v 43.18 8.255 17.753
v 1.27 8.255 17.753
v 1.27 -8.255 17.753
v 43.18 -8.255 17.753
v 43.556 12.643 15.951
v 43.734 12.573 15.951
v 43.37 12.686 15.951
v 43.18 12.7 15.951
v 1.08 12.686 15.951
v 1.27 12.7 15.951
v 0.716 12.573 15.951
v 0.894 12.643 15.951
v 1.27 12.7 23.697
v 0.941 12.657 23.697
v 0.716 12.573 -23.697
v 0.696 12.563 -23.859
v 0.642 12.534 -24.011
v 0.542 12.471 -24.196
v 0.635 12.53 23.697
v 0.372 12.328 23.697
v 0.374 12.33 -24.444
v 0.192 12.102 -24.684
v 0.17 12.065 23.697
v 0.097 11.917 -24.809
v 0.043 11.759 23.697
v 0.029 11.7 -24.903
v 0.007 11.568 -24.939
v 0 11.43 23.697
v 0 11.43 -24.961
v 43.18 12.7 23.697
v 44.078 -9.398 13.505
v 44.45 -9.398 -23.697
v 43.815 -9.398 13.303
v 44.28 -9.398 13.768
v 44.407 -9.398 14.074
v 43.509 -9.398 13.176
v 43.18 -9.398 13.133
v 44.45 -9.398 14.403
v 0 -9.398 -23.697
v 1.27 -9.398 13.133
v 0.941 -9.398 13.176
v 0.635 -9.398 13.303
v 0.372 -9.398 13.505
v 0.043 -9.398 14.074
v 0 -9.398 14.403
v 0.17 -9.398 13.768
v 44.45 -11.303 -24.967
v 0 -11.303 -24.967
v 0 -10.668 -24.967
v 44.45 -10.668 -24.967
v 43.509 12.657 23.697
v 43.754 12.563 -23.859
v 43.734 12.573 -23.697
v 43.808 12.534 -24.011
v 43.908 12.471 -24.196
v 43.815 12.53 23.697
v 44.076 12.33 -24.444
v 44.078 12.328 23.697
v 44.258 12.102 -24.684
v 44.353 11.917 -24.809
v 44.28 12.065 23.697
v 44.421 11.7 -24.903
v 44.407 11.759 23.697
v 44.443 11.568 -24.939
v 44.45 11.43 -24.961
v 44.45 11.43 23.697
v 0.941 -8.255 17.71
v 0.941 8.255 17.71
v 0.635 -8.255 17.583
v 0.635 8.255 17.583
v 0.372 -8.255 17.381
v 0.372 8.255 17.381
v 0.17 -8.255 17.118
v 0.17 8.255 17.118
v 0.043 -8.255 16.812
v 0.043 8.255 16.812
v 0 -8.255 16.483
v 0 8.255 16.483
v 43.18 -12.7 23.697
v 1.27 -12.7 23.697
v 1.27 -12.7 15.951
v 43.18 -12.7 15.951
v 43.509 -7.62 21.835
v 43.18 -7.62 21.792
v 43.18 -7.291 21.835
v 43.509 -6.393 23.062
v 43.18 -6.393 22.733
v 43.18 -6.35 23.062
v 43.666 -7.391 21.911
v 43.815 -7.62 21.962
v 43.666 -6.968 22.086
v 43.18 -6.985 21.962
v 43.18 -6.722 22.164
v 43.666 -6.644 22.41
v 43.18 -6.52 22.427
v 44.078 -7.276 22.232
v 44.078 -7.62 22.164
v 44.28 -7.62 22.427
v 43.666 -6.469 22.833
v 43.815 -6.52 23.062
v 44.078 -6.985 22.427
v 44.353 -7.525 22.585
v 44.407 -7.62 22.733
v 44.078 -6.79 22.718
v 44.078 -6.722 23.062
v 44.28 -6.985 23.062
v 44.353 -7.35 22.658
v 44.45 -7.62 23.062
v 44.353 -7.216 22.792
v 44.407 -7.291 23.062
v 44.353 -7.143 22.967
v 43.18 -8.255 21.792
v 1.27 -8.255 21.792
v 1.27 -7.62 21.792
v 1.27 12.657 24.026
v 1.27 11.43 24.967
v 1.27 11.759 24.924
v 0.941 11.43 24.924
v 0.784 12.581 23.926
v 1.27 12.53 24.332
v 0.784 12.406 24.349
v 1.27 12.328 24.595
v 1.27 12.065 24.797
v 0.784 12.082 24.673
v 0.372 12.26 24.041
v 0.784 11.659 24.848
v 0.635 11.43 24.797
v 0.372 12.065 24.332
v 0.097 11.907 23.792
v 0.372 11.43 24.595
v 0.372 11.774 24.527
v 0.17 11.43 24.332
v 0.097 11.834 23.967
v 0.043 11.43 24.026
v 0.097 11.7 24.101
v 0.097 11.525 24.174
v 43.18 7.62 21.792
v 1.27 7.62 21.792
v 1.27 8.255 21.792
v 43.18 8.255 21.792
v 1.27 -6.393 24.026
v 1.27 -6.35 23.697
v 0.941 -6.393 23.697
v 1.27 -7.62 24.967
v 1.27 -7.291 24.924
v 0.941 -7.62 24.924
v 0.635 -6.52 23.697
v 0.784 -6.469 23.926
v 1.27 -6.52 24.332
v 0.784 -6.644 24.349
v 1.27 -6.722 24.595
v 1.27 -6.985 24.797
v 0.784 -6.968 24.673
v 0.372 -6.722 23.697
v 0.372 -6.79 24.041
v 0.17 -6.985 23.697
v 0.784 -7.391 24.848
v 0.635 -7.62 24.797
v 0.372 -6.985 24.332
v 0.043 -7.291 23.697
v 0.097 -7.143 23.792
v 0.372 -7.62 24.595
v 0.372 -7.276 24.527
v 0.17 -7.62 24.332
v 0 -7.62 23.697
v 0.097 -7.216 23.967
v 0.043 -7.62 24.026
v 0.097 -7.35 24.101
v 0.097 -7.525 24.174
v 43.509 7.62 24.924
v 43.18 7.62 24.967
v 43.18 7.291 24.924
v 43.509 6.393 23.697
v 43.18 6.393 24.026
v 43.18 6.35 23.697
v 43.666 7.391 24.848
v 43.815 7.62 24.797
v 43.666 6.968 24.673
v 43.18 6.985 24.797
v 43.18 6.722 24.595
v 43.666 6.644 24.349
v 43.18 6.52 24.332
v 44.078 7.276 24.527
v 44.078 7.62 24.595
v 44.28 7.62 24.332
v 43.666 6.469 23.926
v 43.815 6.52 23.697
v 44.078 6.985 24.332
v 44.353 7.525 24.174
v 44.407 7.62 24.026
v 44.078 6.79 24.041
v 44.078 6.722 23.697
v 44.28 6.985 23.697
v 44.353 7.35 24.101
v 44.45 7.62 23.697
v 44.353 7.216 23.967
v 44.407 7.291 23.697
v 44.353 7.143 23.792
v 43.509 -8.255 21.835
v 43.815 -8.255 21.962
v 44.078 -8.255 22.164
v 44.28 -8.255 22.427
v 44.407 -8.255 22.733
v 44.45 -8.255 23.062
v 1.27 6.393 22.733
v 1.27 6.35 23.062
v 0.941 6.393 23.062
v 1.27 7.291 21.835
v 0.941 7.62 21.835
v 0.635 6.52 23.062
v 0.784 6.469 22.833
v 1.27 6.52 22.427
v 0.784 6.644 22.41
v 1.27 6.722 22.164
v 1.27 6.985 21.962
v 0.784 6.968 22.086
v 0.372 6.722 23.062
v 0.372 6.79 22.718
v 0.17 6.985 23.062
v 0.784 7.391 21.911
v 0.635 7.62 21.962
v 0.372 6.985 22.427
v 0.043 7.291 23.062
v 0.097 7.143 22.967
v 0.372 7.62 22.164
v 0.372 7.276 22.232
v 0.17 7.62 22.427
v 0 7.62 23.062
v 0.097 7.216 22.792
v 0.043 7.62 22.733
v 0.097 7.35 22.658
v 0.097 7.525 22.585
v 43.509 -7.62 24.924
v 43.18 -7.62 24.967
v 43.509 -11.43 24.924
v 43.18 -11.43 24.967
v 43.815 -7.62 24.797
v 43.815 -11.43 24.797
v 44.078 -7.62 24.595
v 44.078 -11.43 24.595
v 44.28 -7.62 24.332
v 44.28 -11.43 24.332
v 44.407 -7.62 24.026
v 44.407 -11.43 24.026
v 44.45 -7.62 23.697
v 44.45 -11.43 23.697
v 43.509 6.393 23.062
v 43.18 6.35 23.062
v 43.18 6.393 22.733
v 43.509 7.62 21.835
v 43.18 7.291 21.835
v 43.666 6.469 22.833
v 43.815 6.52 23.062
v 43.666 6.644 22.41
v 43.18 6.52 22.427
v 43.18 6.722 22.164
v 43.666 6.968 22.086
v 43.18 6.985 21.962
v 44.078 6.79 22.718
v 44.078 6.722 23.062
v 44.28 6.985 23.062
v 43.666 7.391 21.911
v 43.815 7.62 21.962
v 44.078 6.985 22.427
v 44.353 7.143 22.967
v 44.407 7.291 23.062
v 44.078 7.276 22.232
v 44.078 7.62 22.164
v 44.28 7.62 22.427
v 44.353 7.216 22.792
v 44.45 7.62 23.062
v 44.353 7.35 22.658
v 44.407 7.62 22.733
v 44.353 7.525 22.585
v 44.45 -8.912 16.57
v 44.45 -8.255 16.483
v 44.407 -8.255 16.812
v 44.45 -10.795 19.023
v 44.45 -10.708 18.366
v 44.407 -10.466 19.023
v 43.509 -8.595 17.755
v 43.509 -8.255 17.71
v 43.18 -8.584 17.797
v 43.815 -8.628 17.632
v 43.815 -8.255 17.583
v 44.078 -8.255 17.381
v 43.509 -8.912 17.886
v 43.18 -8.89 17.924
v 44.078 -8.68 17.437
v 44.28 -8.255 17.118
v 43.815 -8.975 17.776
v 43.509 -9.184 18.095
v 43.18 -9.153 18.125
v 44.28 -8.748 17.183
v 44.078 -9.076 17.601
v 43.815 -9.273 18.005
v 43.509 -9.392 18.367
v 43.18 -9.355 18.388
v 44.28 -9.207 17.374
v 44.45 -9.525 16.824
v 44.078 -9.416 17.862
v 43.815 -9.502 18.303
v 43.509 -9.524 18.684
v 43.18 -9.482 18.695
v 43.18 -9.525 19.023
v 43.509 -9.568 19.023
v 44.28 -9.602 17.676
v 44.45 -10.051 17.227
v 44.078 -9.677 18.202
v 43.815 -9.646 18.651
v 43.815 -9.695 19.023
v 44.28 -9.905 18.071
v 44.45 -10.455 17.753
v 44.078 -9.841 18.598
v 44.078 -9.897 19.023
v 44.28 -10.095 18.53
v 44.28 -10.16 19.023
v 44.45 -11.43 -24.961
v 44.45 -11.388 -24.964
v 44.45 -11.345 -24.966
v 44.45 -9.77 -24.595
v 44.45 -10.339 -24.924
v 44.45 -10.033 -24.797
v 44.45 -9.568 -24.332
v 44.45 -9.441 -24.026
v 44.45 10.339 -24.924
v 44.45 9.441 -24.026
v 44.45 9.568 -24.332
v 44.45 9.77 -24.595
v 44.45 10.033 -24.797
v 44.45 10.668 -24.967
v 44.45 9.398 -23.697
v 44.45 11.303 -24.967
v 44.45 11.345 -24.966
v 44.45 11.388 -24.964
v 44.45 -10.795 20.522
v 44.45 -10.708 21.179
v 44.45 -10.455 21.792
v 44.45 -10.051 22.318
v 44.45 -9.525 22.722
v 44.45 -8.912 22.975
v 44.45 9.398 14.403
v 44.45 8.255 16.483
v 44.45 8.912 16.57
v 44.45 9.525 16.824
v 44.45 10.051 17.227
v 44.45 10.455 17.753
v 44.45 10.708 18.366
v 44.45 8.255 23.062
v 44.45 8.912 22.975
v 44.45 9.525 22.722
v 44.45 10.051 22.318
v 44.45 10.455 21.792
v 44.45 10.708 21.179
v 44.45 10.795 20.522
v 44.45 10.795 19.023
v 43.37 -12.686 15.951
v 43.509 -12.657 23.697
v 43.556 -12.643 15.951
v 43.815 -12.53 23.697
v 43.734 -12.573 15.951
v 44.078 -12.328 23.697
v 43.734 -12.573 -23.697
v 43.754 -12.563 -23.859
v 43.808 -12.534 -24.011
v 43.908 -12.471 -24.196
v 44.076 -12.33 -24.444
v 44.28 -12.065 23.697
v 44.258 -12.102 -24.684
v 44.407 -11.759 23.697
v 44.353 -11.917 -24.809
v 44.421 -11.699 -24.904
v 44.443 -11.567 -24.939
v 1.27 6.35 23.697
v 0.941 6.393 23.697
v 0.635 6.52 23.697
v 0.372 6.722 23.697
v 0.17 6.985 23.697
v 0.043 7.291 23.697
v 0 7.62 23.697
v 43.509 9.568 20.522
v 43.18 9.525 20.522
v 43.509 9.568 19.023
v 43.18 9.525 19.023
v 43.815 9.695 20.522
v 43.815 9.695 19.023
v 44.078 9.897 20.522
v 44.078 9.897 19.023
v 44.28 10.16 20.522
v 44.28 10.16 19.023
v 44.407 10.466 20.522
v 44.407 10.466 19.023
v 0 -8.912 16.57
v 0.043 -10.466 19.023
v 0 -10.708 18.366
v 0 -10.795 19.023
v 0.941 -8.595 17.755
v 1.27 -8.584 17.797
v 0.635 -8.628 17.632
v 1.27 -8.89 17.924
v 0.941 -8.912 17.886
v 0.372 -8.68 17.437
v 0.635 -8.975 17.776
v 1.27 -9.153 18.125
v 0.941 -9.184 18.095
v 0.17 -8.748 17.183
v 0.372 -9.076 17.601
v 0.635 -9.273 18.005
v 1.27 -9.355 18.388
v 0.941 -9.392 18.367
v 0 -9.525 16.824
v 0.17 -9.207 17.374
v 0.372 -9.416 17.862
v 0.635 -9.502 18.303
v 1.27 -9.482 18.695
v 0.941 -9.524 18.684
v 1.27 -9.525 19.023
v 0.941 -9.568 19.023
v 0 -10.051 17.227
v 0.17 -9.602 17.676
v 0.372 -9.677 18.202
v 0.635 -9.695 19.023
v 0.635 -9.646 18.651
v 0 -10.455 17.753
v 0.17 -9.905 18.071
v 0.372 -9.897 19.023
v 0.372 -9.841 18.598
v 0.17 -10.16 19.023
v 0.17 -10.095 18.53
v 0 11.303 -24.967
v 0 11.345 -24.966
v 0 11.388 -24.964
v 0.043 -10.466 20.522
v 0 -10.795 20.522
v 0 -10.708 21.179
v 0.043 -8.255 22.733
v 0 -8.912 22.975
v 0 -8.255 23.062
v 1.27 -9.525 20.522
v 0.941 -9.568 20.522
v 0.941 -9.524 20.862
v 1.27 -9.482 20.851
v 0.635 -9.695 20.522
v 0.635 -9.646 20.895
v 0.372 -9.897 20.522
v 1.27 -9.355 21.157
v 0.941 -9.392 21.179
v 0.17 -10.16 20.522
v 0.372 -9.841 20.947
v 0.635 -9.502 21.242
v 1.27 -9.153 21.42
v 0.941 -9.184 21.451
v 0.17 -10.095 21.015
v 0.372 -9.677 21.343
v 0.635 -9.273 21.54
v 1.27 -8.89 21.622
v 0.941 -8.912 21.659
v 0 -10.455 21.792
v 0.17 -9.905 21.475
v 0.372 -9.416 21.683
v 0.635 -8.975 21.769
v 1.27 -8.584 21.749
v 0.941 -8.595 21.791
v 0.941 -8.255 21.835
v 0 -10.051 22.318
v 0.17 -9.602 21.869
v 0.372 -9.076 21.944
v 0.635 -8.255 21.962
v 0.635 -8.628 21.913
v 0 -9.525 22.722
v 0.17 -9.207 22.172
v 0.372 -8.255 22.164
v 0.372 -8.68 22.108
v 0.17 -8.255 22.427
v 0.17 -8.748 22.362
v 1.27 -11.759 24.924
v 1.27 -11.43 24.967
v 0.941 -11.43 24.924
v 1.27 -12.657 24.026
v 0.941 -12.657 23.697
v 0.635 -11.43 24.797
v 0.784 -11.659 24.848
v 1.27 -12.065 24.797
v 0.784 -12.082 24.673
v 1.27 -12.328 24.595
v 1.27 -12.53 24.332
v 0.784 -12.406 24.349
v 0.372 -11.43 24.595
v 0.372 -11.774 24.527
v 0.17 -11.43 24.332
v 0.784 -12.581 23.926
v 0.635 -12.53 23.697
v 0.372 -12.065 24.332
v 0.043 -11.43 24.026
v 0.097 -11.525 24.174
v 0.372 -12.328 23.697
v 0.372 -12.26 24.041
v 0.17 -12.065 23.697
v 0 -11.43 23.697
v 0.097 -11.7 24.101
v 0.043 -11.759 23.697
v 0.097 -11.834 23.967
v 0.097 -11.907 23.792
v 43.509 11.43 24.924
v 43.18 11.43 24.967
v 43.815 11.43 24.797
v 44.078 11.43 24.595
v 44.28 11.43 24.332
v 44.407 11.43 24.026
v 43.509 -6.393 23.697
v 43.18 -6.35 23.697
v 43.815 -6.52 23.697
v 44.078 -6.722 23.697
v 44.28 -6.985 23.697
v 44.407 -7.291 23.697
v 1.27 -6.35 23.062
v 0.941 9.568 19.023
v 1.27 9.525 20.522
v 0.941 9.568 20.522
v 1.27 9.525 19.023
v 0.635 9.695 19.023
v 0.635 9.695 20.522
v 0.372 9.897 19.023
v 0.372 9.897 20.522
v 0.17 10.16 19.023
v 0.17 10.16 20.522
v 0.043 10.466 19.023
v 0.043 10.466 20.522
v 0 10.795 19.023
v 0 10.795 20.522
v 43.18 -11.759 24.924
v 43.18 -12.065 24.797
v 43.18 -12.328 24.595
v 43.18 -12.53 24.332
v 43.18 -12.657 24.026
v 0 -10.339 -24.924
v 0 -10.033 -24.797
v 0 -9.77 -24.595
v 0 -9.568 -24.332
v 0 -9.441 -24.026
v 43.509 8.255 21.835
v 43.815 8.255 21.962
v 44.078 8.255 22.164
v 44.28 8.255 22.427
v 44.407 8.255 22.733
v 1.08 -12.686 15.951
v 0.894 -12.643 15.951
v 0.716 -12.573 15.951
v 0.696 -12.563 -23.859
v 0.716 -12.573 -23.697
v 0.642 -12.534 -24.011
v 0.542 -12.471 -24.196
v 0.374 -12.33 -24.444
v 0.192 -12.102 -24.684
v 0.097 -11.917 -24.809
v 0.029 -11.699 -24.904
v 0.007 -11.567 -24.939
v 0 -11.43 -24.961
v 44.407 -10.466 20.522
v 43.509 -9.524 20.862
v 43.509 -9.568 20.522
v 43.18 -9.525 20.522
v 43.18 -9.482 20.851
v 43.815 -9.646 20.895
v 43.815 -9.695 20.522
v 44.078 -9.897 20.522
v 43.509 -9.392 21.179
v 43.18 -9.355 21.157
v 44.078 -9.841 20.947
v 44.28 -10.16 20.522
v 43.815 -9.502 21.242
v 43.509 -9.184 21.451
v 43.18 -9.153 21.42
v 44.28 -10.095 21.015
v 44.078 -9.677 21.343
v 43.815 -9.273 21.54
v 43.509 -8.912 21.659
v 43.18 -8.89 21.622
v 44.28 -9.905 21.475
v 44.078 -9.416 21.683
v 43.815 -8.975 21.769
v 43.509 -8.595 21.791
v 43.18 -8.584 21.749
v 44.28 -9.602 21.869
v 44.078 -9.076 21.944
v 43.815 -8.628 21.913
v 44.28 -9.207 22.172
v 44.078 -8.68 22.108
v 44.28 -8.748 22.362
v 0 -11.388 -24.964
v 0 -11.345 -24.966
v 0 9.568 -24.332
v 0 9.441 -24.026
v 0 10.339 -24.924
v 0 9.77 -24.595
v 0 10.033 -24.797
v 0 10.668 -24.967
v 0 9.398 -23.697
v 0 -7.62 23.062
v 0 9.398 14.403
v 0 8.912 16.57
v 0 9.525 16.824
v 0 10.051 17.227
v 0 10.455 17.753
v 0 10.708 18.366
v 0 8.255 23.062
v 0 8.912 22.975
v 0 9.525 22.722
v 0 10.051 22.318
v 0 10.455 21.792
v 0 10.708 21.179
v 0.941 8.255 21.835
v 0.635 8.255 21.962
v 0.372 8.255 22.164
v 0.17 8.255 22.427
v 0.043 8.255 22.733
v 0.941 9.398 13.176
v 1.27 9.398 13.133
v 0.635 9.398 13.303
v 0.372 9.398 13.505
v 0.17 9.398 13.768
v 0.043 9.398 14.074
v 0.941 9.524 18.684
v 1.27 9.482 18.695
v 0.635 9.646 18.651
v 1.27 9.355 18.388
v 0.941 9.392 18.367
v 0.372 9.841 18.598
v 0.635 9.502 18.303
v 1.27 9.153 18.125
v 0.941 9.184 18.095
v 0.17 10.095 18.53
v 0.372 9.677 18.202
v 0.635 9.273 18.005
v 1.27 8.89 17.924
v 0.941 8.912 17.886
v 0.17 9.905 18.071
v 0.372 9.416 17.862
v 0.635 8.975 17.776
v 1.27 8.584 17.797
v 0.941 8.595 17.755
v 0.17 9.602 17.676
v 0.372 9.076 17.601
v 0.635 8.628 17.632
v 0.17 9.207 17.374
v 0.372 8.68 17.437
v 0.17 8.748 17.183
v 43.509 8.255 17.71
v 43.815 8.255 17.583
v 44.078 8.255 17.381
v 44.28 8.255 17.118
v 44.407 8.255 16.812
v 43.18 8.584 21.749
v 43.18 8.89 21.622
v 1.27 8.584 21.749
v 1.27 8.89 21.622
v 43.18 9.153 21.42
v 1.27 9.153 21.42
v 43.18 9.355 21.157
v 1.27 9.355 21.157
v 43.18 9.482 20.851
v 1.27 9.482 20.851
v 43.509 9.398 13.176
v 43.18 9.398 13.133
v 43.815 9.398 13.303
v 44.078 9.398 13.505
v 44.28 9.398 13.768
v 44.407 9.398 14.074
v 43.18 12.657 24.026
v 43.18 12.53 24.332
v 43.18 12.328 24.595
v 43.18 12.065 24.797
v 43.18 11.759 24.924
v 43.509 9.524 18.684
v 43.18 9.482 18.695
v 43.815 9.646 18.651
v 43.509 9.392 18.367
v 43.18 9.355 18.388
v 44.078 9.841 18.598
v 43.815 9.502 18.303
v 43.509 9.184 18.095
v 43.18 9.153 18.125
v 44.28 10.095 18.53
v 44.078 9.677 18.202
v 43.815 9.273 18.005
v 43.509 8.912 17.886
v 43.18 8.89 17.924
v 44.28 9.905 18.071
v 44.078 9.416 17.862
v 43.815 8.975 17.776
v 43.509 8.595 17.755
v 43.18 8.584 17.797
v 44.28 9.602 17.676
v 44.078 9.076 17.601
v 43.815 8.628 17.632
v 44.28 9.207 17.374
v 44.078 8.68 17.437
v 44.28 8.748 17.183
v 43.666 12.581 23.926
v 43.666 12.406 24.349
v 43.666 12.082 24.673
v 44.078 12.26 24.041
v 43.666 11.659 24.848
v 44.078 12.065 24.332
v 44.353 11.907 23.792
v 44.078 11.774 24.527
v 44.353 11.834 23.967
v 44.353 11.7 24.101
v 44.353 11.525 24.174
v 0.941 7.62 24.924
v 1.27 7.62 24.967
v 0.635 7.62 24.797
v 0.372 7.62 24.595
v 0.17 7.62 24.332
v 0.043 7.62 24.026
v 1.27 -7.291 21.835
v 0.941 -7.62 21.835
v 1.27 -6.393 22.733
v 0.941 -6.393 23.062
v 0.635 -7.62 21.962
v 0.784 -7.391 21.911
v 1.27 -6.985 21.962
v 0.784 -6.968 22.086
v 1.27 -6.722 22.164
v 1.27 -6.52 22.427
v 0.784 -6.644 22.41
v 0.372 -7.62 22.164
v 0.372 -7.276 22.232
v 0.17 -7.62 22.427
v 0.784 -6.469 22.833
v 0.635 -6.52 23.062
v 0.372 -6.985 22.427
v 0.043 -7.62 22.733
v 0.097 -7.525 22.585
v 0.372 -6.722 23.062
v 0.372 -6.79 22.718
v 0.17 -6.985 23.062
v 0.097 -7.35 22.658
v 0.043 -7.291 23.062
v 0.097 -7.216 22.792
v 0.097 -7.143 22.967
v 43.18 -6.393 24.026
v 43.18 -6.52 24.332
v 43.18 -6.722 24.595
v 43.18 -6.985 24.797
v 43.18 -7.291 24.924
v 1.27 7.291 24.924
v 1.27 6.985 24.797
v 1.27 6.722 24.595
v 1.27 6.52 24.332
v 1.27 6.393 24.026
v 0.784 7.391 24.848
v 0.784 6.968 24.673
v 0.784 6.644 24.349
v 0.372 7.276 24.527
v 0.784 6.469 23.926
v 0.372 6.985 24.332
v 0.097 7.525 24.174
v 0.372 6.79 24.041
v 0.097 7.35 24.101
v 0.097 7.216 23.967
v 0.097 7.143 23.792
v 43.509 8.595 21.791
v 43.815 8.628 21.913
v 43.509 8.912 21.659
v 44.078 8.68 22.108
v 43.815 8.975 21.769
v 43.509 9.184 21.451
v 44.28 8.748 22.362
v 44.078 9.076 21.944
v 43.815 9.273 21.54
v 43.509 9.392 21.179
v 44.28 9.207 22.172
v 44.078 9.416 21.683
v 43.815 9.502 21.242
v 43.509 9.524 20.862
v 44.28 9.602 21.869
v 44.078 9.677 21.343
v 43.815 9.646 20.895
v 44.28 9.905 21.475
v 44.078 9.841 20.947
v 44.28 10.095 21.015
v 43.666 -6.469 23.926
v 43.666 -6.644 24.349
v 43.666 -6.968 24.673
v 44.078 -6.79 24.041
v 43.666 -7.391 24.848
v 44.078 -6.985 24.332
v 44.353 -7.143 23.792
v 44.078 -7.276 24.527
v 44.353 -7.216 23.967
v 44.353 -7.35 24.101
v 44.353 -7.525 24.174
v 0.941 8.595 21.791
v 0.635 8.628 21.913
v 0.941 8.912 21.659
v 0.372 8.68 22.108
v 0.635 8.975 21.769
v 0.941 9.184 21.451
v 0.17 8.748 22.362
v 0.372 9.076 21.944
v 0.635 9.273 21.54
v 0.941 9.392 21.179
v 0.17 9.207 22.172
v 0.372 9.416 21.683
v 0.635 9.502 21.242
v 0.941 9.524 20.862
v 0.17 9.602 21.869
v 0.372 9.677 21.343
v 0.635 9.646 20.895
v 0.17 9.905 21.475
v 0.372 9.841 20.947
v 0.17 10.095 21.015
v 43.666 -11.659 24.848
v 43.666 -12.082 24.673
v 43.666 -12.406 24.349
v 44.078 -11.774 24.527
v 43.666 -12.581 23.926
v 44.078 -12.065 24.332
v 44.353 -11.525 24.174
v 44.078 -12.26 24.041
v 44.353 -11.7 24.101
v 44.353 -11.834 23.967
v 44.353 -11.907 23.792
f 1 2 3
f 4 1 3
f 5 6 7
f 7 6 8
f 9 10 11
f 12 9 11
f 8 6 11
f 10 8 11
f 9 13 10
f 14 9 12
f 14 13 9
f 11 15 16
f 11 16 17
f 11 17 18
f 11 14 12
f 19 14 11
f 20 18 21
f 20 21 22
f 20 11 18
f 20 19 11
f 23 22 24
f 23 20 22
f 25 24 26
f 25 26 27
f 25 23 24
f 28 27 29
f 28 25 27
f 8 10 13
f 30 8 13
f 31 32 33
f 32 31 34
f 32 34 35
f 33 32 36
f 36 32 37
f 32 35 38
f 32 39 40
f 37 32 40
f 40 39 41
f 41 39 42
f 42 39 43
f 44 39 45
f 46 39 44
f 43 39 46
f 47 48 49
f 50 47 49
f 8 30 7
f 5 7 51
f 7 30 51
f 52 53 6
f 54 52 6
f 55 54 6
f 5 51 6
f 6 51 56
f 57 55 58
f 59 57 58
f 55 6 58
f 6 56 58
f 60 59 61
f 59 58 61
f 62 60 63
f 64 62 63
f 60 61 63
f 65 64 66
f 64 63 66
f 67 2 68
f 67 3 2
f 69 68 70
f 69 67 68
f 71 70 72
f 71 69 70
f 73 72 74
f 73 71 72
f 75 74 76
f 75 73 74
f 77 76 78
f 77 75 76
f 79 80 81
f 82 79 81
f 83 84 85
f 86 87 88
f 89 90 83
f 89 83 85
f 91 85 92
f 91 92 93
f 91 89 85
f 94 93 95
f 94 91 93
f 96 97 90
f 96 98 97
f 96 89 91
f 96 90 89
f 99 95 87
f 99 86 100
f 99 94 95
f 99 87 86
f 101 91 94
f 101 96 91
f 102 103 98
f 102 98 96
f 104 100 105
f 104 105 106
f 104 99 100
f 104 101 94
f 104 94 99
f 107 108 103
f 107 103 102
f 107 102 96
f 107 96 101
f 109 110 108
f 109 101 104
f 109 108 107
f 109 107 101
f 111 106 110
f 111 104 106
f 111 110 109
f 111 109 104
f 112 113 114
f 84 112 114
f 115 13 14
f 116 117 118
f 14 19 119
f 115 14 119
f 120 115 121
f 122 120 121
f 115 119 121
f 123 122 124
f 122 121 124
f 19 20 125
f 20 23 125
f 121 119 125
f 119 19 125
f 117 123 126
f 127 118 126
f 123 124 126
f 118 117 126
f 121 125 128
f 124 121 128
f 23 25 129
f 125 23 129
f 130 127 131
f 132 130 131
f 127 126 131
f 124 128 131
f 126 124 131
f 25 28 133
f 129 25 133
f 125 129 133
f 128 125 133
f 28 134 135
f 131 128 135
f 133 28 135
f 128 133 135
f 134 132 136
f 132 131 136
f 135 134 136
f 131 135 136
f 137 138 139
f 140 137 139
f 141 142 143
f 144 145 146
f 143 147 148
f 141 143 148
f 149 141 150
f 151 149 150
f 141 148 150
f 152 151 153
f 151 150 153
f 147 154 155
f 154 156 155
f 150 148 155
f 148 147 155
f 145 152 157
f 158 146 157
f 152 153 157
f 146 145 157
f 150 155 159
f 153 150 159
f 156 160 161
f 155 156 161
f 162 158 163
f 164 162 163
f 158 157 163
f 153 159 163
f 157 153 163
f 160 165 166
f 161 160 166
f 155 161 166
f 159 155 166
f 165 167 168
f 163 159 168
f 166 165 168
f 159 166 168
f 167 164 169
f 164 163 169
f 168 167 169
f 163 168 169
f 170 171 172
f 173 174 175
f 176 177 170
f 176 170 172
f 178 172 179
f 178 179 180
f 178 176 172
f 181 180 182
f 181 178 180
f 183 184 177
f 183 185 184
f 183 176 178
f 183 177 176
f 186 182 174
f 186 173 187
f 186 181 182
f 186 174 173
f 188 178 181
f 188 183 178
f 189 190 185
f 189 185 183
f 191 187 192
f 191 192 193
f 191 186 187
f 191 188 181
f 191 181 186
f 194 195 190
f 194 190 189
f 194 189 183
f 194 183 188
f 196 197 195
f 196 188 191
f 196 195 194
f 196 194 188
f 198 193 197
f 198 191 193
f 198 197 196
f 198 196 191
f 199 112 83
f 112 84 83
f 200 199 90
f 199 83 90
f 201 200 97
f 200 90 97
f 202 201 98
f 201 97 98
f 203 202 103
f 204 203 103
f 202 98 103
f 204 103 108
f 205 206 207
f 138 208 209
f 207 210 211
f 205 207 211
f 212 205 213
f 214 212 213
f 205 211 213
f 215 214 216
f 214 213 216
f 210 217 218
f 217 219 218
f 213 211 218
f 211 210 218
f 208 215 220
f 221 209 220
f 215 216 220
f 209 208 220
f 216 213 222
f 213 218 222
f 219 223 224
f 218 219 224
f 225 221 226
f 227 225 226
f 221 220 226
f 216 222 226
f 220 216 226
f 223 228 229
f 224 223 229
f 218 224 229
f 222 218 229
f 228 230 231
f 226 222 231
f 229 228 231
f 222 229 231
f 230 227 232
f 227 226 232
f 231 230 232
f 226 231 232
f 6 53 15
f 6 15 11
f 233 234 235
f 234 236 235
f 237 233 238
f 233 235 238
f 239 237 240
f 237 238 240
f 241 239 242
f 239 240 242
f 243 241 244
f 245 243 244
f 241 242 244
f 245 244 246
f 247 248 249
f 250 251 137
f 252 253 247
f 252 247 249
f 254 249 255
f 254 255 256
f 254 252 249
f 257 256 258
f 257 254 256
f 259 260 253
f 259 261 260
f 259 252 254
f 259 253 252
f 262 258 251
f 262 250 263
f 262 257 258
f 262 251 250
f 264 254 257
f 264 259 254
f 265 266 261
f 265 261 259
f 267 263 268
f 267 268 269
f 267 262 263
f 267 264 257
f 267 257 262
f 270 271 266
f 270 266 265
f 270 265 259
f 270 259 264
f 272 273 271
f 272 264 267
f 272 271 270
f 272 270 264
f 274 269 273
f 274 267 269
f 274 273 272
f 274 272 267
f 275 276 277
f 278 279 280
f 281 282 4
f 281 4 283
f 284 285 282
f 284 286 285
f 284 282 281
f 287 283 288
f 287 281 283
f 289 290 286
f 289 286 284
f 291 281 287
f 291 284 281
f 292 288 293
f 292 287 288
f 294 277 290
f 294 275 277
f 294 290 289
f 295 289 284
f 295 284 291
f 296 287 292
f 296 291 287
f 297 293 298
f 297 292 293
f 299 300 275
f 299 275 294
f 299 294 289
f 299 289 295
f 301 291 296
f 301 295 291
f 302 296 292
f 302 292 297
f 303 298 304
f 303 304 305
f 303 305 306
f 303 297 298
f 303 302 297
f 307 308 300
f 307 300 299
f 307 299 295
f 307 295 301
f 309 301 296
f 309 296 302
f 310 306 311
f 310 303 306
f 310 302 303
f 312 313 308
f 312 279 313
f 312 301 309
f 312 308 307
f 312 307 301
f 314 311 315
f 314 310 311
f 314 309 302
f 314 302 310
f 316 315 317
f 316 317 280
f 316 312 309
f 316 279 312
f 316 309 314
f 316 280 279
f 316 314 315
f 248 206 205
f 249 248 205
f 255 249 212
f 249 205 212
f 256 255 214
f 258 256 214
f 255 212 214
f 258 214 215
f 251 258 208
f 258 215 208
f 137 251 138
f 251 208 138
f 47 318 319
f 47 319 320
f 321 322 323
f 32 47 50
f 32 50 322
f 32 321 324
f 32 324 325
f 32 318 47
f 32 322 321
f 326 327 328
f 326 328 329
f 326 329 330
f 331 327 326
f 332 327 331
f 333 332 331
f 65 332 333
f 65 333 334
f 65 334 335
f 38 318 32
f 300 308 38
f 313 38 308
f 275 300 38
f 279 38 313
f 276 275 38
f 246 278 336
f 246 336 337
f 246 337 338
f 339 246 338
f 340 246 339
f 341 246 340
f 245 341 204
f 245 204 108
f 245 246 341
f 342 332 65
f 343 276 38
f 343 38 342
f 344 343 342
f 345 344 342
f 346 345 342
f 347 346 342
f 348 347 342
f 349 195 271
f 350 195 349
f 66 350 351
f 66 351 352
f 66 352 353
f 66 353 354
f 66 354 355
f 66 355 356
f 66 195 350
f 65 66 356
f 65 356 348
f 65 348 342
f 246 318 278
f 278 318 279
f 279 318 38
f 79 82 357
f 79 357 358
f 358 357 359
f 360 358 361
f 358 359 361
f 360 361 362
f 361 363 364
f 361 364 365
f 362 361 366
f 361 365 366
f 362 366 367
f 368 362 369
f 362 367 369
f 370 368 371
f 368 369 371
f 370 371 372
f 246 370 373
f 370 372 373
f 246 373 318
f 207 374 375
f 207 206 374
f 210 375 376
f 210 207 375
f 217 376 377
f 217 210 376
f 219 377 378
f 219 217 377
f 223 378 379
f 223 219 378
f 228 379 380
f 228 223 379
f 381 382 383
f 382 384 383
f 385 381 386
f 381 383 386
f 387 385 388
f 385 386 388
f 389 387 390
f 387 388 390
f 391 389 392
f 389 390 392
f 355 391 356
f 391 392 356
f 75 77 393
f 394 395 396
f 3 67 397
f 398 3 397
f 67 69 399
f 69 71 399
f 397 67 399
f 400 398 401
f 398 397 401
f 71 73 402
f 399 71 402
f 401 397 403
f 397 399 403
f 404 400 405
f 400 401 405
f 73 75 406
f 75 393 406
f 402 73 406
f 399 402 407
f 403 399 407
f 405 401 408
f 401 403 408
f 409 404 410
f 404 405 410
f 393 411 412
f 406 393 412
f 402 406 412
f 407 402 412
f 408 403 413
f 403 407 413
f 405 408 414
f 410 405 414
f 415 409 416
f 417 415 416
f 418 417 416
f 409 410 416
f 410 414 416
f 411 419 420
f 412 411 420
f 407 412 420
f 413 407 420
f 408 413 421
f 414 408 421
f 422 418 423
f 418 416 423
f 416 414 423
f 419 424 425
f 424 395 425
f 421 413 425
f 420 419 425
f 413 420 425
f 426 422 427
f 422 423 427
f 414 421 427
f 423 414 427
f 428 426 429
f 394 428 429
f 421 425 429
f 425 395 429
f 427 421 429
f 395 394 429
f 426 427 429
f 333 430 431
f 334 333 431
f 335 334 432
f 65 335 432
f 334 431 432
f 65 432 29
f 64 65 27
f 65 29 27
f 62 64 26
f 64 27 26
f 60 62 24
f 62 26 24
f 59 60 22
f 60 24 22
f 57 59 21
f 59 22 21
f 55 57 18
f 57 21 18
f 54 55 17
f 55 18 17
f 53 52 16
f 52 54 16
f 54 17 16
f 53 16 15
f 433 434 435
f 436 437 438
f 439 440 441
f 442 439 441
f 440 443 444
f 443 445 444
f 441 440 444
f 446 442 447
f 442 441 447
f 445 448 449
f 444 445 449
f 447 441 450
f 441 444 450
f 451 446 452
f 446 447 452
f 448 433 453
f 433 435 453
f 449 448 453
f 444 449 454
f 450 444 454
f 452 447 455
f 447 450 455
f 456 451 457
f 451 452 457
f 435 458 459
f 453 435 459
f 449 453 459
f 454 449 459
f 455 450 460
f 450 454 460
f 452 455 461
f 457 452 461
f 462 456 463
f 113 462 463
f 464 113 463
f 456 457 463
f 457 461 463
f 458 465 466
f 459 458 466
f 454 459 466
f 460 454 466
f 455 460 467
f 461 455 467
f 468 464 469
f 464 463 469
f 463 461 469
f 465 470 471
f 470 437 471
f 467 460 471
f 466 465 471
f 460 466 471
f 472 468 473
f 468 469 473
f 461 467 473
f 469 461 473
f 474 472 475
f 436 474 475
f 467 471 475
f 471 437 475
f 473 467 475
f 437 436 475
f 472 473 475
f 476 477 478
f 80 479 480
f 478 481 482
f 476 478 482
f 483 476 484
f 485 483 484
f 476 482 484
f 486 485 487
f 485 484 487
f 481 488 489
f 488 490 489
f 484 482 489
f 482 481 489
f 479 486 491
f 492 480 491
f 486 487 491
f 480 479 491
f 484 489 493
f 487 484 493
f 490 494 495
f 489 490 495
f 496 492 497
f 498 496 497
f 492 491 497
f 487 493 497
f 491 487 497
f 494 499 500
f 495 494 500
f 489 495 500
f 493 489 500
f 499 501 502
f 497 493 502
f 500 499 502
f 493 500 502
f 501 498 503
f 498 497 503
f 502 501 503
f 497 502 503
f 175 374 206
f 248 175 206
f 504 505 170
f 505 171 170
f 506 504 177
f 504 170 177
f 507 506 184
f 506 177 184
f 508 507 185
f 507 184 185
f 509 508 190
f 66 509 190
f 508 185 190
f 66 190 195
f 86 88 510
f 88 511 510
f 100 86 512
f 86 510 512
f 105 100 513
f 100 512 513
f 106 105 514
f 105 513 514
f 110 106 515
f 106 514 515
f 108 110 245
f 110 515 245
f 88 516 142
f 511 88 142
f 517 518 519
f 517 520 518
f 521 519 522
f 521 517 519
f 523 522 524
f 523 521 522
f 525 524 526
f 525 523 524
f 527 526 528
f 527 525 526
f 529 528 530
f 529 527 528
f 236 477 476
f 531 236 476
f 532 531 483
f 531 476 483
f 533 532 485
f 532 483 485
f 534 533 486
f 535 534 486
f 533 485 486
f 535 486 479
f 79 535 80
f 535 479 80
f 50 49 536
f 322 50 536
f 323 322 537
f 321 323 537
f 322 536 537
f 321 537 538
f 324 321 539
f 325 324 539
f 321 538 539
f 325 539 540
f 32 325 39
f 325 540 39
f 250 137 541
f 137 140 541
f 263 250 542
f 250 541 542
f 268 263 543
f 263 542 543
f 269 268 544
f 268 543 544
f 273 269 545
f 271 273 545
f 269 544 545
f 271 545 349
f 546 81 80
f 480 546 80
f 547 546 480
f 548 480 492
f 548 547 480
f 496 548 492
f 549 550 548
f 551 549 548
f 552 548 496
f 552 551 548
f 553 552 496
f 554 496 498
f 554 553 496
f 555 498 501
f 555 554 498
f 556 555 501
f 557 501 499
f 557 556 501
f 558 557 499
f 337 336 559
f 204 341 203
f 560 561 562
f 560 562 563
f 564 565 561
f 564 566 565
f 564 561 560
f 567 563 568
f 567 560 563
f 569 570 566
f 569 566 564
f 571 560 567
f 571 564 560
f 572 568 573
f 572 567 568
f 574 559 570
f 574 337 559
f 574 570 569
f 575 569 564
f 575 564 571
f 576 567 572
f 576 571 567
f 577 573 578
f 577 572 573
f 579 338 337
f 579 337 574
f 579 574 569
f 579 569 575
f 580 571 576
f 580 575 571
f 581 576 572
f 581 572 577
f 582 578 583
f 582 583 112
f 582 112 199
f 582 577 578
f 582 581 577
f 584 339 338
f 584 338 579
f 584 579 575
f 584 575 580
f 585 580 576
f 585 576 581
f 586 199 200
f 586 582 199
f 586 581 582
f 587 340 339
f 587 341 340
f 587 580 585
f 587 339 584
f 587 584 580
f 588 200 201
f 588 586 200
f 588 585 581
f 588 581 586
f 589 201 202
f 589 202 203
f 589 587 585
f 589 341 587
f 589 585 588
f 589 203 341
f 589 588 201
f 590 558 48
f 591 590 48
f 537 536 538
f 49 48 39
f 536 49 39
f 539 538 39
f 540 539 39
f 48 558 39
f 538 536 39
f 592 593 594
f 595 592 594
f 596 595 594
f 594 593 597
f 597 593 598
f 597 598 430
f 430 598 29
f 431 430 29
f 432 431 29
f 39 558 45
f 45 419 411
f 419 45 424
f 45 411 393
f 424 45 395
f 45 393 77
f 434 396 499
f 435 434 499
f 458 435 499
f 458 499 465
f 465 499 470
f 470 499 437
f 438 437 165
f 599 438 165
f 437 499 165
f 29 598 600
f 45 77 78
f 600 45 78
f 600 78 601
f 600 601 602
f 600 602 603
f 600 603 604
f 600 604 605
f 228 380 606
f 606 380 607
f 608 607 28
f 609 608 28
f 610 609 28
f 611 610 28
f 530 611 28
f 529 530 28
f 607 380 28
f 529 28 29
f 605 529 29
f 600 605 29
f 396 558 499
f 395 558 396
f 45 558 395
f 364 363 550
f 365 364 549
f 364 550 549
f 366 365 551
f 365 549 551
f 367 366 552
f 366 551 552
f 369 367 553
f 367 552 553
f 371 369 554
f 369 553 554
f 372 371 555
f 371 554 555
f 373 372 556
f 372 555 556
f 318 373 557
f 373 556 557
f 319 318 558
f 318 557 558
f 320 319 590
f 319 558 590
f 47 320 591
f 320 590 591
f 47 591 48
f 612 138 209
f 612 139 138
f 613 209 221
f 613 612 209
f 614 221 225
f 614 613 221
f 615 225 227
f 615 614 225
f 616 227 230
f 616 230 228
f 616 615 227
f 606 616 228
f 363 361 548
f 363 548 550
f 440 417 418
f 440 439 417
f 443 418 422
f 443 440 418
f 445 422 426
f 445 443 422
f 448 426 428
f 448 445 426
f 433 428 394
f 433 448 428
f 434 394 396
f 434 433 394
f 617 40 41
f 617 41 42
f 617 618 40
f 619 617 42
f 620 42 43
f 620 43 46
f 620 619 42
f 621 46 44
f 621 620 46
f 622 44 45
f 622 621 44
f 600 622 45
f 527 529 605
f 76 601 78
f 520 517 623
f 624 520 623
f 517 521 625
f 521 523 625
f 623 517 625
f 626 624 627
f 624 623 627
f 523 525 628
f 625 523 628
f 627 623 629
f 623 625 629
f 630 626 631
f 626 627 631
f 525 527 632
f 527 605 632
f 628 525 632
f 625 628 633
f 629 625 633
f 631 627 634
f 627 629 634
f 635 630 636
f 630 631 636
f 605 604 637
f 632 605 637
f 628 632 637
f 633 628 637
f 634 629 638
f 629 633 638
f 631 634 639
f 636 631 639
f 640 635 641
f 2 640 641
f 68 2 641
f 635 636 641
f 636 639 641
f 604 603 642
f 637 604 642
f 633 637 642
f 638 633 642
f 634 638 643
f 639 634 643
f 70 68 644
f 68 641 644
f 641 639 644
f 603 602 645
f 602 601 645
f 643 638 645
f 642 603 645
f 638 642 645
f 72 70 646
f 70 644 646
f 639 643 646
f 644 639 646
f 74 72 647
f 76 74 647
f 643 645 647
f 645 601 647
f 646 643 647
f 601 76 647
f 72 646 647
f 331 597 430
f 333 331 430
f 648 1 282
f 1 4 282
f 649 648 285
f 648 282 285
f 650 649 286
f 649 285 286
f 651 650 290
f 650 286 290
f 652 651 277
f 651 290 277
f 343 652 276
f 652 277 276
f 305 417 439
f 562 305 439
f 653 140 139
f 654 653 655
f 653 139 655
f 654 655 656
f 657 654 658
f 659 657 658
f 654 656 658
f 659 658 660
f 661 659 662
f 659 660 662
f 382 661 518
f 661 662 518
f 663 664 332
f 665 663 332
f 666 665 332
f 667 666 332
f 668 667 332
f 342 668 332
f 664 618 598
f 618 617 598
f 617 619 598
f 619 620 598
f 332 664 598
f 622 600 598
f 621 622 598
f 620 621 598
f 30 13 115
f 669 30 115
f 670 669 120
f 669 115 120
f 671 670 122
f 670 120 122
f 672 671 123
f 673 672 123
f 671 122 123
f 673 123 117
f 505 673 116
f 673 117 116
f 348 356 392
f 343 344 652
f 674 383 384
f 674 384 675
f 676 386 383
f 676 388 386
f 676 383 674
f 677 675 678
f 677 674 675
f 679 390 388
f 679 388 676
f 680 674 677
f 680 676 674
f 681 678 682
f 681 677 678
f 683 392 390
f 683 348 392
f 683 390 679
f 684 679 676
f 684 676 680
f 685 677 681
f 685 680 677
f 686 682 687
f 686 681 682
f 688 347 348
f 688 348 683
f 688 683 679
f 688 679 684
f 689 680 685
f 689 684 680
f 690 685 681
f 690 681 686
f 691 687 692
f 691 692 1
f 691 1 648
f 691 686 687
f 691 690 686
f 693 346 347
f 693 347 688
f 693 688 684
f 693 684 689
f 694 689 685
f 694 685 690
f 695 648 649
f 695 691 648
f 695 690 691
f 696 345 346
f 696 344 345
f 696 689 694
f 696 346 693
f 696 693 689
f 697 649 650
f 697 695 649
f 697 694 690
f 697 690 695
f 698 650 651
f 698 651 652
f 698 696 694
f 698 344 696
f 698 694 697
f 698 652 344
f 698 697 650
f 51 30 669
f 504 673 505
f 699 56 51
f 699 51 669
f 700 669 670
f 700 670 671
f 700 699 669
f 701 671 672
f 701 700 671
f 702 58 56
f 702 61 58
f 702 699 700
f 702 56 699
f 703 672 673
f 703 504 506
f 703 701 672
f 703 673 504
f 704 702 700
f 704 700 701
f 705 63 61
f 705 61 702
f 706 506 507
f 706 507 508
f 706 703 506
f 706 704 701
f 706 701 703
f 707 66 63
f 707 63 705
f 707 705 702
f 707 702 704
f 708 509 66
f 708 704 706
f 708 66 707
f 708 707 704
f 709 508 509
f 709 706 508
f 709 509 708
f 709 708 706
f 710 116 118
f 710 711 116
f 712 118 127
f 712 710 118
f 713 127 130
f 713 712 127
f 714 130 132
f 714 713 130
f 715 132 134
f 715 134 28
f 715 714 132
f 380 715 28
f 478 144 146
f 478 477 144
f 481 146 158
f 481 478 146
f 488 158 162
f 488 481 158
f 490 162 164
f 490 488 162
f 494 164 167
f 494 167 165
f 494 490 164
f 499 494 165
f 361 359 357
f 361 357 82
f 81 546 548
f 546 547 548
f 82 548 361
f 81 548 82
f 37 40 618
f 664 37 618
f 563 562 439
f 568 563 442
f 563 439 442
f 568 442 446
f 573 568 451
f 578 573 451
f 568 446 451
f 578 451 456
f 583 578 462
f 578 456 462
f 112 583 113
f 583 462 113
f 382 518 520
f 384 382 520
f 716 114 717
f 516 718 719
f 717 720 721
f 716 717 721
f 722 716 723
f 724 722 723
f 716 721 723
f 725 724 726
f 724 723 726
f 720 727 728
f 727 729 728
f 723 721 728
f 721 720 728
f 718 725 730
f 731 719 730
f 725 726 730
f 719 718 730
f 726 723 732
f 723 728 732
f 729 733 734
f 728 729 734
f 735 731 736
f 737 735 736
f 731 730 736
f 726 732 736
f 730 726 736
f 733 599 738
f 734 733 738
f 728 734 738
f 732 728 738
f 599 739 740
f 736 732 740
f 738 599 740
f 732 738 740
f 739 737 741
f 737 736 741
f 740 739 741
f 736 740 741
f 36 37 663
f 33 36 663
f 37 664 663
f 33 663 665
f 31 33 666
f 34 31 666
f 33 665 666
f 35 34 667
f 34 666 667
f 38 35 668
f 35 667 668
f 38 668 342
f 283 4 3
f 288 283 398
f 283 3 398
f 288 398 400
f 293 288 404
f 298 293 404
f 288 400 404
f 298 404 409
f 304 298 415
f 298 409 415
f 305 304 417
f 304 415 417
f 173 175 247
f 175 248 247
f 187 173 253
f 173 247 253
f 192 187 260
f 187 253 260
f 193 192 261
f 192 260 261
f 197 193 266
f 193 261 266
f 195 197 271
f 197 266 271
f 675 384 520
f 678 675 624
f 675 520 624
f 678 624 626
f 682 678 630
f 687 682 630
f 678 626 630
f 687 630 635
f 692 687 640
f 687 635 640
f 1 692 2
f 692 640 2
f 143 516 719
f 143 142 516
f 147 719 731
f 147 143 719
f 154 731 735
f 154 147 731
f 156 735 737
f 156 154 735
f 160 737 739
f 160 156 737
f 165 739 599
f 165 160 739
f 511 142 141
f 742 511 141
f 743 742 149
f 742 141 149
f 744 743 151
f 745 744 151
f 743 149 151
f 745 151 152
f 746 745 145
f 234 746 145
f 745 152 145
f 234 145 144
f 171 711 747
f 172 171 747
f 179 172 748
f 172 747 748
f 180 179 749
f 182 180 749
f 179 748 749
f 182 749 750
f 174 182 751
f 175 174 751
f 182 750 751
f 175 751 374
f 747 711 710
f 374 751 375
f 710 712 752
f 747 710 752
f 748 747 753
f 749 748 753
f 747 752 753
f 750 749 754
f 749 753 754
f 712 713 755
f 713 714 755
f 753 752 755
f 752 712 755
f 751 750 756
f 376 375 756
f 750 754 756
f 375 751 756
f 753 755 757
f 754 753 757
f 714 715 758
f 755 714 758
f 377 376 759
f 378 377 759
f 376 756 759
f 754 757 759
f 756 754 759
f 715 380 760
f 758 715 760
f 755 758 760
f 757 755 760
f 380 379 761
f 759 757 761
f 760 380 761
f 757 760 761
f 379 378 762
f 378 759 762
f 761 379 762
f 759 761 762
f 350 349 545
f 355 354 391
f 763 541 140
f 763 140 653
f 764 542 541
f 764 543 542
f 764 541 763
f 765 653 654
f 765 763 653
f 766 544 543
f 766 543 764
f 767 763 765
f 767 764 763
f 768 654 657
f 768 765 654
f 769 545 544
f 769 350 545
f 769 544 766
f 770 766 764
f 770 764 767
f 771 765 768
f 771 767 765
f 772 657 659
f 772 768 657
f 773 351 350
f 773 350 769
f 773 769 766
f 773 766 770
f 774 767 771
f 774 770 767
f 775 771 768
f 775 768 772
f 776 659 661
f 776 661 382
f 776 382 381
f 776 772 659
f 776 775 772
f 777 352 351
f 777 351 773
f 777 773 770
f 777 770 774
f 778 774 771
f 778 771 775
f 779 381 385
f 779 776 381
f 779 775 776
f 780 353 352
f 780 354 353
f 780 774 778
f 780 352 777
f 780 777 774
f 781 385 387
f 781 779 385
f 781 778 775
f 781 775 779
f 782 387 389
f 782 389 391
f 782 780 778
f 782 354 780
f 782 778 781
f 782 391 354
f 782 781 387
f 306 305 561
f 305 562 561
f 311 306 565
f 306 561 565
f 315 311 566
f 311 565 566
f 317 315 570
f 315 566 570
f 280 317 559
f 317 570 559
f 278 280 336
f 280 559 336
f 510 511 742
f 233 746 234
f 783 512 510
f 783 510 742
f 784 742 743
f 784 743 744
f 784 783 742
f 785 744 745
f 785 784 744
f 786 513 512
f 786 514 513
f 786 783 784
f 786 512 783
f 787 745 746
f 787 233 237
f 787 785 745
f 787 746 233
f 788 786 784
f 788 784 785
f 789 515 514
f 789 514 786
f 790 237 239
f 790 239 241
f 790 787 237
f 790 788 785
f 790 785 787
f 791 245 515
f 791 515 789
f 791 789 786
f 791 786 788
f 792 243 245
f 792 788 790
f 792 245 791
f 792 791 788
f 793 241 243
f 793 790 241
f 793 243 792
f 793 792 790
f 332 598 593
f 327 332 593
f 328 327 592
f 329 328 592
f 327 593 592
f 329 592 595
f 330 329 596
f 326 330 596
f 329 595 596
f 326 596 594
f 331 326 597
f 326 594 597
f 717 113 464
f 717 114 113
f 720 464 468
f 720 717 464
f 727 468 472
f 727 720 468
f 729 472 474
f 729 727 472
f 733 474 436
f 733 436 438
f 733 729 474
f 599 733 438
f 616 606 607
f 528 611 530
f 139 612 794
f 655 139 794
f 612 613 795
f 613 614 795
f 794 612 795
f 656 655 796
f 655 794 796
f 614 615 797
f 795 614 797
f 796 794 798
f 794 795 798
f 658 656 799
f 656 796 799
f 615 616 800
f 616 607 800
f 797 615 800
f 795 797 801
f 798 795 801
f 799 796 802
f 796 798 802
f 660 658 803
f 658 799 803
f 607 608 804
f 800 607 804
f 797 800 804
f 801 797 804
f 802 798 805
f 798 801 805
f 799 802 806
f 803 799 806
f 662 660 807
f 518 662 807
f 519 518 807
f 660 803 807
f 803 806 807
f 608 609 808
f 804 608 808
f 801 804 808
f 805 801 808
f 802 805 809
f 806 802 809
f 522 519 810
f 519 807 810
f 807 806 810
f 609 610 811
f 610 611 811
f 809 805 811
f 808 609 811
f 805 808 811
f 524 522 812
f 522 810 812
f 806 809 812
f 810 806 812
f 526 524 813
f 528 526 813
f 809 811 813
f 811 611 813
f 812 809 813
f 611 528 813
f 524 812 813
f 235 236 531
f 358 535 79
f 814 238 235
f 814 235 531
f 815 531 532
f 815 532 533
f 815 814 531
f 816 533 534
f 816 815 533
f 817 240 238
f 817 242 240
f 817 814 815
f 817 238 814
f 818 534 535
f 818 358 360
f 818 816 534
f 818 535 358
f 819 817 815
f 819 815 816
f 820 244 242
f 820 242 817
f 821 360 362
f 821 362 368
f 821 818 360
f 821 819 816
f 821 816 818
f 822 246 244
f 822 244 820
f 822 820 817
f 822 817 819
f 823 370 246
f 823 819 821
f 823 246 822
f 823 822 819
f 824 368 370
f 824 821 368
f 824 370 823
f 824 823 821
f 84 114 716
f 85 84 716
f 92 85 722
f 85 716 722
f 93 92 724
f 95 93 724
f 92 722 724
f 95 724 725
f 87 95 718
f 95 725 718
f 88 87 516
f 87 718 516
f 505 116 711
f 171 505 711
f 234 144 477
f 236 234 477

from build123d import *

# Parameters (mm, degrees)
F1_DEPTH = 44.45
F2_R     = 1.27


with BuildPart() as f1:
    # F0 (on Right) → F1 (new body)
    with BuildSketch(Plane.YZ):
        with BuildLine():
            Line((10.668, -24.967044556), (11.303, -24.967044556))
            ThreePointArc((11.303, -24.967044556), (12.2010256121, -24.5950701681), (12.573, -23.697044556))
            Line((12.573, -23.697044556), (12.573, 15.9512687449))
            Line((12.573, 15.9512687449), (12.7, 15.9512687449))
            Line((12.7, 15.9512687449), (12.7, 23.697044556))
            ThreePointArc((12.7, 23.697044556), (12.3280256121, 24.5950701681), (11.43, 24.967044556))
            Line((11.43, 24.967044556), (7.62, 24.967044556))
            ThreePointArc((7.62, 24.967044556), (6.7219743879, 24.5950701681), (6.35, 23.697044556))
            Line((6.35, 23.697044556), (6.35, 23.062044556))
            ThreePointArc((6.35, 23.062044556), (6.7219743879, 22.1640189439), (7.62, 21.792044556))
            Line((7.62, 21.792044556), (8.255, 21.792044556))
            ThreePointArc((8.255, 21.792044556), (9.1530256121, 21.4200701681), (9.525, 20.522044556))
            Line((9.525, 20.522044556), (9.525, 19.023438717))
            ThreePointArc((9.525, 19.023438717), (9.1530256121, 18.1254131049), (8.255, 17.753438717))
            Line((8.255, 17.753438717), (-8.255, 17.753438717))
            ThreePointArc((-8.255, 17.753438717), (-9.1530256121, 18.1254131049), (-9.525, 19.023438717))
            Line((-9.525, 19.023438717), (-9.525, 20.522044556))
            ThreePointArc((-9.525, 20.522044556), (-9.1530256121, 21.4200701681), (-8.255, 21.792044556))
            Line((-8.255, 21.792044556), (-7.62, 21.792044556))
            ThreePointArc((-7.62, 21.792044556), (-6.7219743879, 22.1640189439), (-6.35, 23.062044556))
            Line((-6.35, 23.062044556), (-6.35, 23.697044556))
            ThreePointArc((-6.35, 23.697044556), (-6.7219743879, 24.5950701681), (-7.62, 24.967044556))
            Line((-7.62, 24.967044556), (-11.43, 24.967044556))
            ThreePointArc((-11.43, 24.967044556), (-12.3280256121, 24.5950701681), (-12.7, 23.697044556))
            Line((-12.7, 23.697044556), (-12.7, 15.9512687449))
            Line((-12.7, 15.9512687449), (-12.573, 15.9512687449))
            Line((-12.573, 15.9512687449), (-12.573, -23.697044556))
            ThreePointArc((-12.573, -23.697044556), (-12.2010256121, -24.5950701681), (-11.303, -24.967044556))
            Line((-11.303, -24.967044556), (-10.668, -24.967044556))
            ThreePointArc((-10.668, -24.967044556), (-9.7699743879, -24.5950701681), (-9.398, -23.697044556))
            Line((-9.398, -23.697044556), (-9.398, 13.132955444))
            Line((-9.398, 13.132955444), (9.398, 13.132955444))
            Line((9.398, 13.132955444), (9.398, -23.697044556))
            ThreePointArc((9.398, -23.697044556), (9.7699743879, -24.5950701681), (10.668, -24.967044556))
        make_face()
    extrude(amount=F1_DEPTH)

    # F2
    f2_edges = [f1.edges().sort_by_distance(p)[0] for p in [
        (44.45, -12.7, 19.824157),
        (44.45, -9.525, 24.967045),
        (0, 0, 17.753439),
        (0, 0, 13.132955),
        (44.45, 0, 13.132955),
    ]]
    fillet(f2_edges, radius=F2_R)


solid = f1.part
